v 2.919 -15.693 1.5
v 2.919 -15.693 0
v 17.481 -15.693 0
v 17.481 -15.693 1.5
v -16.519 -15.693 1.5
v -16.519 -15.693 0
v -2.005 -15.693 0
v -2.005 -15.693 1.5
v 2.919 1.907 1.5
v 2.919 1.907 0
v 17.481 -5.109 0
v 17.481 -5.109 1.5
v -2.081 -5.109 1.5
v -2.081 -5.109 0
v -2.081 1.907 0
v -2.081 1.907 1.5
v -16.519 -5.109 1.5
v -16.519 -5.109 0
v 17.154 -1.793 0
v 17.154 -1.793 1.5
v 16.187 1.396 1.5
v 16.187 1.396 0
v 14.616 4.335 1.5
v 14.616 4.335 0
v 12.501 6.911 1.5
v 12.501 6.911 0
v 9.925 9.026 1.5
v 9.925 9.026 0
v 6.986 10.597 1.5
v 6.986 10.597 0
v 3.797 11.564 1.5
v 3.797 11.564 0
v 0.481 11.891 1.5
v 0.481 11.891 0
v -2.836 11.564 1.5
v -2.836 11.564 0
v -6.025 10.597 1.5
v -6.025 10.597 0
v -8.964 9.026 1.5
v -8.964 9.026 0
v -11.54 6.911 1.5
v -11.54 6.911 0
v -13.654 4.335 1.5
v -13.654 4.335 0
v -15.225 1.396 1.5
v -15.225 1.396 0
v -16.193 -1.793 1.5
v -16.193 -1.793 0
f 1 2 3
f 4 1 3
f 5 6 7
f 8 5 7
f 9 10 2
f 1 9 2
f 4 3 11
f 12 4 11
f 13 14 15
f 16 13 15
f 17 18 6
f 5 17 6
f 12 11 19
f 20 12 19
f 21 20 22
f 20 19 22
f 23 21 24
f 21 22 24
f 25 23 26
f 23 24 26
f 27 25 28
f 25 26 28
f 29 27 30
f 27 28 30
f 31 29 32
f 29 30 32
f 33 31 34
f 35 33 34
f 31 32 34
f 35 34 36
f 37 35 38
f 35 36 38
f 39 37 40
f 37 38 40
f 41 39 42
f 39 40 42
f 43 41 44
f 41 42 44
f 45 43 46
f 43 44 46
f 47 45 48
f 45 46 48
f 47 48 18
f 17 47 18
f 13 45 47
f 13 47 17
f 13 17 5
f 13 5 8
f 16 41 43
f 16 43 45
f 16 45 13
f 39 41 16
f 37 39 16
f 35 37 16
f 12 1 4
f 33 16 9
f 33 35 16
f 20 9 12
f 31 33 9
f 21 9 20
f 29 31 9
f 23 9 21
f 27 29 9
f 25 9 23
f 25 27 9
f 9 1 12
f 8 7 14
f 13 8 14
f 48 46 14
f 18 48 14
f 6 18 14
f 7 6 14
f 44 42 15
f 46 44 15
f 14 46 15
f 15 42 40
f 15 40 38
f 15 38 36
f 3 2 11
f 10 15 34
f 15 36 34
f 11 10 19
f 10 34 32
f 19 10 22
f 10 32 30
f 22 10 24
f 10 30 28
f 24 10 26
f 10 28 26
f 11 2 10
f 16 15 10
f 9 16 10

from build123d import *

# Parameters (mm, degrees)
F1_DEPTH = 1.5


with BuildPart() as f1:
    # F0 (on Top) → F1 (new body)
    with BuildSketch(Plane.XY):
        with BuildLine():
            Line((17.480557, -15.692959), (17.480557, -5.109434))
            ThreePointArc((17.480557, -5.109434), (0.480557, 11.890566), (-16.519443, -5.109434))
            Line((-16.519443, -5.109434), (-16.519443, -15.692959))
            Line((-16.519443, -15.692959), (-2.00486, -15.692959))
            Line((-2.00486, -15.692959), (-2.081214, -5.109434))
            Line((-2.081214, -5.109434), (-2.081214, 1.907042))
            Line((-2.081214, 1.907042), (0.418786, 1.907042))
            Line((0.418786, 1.907042), (2.918786, 1.907042))
            Line((2.918786, 1.907042), (2.918786, -5.109434))
            Line((2.918786, -5.109434), (2.918786, -15.692959))
            Line((2.918786, -15.692959), (17.480557, -15.692959))
        make_face()
    extrude(amount=F1_DEPTH)


solid = f1.part
